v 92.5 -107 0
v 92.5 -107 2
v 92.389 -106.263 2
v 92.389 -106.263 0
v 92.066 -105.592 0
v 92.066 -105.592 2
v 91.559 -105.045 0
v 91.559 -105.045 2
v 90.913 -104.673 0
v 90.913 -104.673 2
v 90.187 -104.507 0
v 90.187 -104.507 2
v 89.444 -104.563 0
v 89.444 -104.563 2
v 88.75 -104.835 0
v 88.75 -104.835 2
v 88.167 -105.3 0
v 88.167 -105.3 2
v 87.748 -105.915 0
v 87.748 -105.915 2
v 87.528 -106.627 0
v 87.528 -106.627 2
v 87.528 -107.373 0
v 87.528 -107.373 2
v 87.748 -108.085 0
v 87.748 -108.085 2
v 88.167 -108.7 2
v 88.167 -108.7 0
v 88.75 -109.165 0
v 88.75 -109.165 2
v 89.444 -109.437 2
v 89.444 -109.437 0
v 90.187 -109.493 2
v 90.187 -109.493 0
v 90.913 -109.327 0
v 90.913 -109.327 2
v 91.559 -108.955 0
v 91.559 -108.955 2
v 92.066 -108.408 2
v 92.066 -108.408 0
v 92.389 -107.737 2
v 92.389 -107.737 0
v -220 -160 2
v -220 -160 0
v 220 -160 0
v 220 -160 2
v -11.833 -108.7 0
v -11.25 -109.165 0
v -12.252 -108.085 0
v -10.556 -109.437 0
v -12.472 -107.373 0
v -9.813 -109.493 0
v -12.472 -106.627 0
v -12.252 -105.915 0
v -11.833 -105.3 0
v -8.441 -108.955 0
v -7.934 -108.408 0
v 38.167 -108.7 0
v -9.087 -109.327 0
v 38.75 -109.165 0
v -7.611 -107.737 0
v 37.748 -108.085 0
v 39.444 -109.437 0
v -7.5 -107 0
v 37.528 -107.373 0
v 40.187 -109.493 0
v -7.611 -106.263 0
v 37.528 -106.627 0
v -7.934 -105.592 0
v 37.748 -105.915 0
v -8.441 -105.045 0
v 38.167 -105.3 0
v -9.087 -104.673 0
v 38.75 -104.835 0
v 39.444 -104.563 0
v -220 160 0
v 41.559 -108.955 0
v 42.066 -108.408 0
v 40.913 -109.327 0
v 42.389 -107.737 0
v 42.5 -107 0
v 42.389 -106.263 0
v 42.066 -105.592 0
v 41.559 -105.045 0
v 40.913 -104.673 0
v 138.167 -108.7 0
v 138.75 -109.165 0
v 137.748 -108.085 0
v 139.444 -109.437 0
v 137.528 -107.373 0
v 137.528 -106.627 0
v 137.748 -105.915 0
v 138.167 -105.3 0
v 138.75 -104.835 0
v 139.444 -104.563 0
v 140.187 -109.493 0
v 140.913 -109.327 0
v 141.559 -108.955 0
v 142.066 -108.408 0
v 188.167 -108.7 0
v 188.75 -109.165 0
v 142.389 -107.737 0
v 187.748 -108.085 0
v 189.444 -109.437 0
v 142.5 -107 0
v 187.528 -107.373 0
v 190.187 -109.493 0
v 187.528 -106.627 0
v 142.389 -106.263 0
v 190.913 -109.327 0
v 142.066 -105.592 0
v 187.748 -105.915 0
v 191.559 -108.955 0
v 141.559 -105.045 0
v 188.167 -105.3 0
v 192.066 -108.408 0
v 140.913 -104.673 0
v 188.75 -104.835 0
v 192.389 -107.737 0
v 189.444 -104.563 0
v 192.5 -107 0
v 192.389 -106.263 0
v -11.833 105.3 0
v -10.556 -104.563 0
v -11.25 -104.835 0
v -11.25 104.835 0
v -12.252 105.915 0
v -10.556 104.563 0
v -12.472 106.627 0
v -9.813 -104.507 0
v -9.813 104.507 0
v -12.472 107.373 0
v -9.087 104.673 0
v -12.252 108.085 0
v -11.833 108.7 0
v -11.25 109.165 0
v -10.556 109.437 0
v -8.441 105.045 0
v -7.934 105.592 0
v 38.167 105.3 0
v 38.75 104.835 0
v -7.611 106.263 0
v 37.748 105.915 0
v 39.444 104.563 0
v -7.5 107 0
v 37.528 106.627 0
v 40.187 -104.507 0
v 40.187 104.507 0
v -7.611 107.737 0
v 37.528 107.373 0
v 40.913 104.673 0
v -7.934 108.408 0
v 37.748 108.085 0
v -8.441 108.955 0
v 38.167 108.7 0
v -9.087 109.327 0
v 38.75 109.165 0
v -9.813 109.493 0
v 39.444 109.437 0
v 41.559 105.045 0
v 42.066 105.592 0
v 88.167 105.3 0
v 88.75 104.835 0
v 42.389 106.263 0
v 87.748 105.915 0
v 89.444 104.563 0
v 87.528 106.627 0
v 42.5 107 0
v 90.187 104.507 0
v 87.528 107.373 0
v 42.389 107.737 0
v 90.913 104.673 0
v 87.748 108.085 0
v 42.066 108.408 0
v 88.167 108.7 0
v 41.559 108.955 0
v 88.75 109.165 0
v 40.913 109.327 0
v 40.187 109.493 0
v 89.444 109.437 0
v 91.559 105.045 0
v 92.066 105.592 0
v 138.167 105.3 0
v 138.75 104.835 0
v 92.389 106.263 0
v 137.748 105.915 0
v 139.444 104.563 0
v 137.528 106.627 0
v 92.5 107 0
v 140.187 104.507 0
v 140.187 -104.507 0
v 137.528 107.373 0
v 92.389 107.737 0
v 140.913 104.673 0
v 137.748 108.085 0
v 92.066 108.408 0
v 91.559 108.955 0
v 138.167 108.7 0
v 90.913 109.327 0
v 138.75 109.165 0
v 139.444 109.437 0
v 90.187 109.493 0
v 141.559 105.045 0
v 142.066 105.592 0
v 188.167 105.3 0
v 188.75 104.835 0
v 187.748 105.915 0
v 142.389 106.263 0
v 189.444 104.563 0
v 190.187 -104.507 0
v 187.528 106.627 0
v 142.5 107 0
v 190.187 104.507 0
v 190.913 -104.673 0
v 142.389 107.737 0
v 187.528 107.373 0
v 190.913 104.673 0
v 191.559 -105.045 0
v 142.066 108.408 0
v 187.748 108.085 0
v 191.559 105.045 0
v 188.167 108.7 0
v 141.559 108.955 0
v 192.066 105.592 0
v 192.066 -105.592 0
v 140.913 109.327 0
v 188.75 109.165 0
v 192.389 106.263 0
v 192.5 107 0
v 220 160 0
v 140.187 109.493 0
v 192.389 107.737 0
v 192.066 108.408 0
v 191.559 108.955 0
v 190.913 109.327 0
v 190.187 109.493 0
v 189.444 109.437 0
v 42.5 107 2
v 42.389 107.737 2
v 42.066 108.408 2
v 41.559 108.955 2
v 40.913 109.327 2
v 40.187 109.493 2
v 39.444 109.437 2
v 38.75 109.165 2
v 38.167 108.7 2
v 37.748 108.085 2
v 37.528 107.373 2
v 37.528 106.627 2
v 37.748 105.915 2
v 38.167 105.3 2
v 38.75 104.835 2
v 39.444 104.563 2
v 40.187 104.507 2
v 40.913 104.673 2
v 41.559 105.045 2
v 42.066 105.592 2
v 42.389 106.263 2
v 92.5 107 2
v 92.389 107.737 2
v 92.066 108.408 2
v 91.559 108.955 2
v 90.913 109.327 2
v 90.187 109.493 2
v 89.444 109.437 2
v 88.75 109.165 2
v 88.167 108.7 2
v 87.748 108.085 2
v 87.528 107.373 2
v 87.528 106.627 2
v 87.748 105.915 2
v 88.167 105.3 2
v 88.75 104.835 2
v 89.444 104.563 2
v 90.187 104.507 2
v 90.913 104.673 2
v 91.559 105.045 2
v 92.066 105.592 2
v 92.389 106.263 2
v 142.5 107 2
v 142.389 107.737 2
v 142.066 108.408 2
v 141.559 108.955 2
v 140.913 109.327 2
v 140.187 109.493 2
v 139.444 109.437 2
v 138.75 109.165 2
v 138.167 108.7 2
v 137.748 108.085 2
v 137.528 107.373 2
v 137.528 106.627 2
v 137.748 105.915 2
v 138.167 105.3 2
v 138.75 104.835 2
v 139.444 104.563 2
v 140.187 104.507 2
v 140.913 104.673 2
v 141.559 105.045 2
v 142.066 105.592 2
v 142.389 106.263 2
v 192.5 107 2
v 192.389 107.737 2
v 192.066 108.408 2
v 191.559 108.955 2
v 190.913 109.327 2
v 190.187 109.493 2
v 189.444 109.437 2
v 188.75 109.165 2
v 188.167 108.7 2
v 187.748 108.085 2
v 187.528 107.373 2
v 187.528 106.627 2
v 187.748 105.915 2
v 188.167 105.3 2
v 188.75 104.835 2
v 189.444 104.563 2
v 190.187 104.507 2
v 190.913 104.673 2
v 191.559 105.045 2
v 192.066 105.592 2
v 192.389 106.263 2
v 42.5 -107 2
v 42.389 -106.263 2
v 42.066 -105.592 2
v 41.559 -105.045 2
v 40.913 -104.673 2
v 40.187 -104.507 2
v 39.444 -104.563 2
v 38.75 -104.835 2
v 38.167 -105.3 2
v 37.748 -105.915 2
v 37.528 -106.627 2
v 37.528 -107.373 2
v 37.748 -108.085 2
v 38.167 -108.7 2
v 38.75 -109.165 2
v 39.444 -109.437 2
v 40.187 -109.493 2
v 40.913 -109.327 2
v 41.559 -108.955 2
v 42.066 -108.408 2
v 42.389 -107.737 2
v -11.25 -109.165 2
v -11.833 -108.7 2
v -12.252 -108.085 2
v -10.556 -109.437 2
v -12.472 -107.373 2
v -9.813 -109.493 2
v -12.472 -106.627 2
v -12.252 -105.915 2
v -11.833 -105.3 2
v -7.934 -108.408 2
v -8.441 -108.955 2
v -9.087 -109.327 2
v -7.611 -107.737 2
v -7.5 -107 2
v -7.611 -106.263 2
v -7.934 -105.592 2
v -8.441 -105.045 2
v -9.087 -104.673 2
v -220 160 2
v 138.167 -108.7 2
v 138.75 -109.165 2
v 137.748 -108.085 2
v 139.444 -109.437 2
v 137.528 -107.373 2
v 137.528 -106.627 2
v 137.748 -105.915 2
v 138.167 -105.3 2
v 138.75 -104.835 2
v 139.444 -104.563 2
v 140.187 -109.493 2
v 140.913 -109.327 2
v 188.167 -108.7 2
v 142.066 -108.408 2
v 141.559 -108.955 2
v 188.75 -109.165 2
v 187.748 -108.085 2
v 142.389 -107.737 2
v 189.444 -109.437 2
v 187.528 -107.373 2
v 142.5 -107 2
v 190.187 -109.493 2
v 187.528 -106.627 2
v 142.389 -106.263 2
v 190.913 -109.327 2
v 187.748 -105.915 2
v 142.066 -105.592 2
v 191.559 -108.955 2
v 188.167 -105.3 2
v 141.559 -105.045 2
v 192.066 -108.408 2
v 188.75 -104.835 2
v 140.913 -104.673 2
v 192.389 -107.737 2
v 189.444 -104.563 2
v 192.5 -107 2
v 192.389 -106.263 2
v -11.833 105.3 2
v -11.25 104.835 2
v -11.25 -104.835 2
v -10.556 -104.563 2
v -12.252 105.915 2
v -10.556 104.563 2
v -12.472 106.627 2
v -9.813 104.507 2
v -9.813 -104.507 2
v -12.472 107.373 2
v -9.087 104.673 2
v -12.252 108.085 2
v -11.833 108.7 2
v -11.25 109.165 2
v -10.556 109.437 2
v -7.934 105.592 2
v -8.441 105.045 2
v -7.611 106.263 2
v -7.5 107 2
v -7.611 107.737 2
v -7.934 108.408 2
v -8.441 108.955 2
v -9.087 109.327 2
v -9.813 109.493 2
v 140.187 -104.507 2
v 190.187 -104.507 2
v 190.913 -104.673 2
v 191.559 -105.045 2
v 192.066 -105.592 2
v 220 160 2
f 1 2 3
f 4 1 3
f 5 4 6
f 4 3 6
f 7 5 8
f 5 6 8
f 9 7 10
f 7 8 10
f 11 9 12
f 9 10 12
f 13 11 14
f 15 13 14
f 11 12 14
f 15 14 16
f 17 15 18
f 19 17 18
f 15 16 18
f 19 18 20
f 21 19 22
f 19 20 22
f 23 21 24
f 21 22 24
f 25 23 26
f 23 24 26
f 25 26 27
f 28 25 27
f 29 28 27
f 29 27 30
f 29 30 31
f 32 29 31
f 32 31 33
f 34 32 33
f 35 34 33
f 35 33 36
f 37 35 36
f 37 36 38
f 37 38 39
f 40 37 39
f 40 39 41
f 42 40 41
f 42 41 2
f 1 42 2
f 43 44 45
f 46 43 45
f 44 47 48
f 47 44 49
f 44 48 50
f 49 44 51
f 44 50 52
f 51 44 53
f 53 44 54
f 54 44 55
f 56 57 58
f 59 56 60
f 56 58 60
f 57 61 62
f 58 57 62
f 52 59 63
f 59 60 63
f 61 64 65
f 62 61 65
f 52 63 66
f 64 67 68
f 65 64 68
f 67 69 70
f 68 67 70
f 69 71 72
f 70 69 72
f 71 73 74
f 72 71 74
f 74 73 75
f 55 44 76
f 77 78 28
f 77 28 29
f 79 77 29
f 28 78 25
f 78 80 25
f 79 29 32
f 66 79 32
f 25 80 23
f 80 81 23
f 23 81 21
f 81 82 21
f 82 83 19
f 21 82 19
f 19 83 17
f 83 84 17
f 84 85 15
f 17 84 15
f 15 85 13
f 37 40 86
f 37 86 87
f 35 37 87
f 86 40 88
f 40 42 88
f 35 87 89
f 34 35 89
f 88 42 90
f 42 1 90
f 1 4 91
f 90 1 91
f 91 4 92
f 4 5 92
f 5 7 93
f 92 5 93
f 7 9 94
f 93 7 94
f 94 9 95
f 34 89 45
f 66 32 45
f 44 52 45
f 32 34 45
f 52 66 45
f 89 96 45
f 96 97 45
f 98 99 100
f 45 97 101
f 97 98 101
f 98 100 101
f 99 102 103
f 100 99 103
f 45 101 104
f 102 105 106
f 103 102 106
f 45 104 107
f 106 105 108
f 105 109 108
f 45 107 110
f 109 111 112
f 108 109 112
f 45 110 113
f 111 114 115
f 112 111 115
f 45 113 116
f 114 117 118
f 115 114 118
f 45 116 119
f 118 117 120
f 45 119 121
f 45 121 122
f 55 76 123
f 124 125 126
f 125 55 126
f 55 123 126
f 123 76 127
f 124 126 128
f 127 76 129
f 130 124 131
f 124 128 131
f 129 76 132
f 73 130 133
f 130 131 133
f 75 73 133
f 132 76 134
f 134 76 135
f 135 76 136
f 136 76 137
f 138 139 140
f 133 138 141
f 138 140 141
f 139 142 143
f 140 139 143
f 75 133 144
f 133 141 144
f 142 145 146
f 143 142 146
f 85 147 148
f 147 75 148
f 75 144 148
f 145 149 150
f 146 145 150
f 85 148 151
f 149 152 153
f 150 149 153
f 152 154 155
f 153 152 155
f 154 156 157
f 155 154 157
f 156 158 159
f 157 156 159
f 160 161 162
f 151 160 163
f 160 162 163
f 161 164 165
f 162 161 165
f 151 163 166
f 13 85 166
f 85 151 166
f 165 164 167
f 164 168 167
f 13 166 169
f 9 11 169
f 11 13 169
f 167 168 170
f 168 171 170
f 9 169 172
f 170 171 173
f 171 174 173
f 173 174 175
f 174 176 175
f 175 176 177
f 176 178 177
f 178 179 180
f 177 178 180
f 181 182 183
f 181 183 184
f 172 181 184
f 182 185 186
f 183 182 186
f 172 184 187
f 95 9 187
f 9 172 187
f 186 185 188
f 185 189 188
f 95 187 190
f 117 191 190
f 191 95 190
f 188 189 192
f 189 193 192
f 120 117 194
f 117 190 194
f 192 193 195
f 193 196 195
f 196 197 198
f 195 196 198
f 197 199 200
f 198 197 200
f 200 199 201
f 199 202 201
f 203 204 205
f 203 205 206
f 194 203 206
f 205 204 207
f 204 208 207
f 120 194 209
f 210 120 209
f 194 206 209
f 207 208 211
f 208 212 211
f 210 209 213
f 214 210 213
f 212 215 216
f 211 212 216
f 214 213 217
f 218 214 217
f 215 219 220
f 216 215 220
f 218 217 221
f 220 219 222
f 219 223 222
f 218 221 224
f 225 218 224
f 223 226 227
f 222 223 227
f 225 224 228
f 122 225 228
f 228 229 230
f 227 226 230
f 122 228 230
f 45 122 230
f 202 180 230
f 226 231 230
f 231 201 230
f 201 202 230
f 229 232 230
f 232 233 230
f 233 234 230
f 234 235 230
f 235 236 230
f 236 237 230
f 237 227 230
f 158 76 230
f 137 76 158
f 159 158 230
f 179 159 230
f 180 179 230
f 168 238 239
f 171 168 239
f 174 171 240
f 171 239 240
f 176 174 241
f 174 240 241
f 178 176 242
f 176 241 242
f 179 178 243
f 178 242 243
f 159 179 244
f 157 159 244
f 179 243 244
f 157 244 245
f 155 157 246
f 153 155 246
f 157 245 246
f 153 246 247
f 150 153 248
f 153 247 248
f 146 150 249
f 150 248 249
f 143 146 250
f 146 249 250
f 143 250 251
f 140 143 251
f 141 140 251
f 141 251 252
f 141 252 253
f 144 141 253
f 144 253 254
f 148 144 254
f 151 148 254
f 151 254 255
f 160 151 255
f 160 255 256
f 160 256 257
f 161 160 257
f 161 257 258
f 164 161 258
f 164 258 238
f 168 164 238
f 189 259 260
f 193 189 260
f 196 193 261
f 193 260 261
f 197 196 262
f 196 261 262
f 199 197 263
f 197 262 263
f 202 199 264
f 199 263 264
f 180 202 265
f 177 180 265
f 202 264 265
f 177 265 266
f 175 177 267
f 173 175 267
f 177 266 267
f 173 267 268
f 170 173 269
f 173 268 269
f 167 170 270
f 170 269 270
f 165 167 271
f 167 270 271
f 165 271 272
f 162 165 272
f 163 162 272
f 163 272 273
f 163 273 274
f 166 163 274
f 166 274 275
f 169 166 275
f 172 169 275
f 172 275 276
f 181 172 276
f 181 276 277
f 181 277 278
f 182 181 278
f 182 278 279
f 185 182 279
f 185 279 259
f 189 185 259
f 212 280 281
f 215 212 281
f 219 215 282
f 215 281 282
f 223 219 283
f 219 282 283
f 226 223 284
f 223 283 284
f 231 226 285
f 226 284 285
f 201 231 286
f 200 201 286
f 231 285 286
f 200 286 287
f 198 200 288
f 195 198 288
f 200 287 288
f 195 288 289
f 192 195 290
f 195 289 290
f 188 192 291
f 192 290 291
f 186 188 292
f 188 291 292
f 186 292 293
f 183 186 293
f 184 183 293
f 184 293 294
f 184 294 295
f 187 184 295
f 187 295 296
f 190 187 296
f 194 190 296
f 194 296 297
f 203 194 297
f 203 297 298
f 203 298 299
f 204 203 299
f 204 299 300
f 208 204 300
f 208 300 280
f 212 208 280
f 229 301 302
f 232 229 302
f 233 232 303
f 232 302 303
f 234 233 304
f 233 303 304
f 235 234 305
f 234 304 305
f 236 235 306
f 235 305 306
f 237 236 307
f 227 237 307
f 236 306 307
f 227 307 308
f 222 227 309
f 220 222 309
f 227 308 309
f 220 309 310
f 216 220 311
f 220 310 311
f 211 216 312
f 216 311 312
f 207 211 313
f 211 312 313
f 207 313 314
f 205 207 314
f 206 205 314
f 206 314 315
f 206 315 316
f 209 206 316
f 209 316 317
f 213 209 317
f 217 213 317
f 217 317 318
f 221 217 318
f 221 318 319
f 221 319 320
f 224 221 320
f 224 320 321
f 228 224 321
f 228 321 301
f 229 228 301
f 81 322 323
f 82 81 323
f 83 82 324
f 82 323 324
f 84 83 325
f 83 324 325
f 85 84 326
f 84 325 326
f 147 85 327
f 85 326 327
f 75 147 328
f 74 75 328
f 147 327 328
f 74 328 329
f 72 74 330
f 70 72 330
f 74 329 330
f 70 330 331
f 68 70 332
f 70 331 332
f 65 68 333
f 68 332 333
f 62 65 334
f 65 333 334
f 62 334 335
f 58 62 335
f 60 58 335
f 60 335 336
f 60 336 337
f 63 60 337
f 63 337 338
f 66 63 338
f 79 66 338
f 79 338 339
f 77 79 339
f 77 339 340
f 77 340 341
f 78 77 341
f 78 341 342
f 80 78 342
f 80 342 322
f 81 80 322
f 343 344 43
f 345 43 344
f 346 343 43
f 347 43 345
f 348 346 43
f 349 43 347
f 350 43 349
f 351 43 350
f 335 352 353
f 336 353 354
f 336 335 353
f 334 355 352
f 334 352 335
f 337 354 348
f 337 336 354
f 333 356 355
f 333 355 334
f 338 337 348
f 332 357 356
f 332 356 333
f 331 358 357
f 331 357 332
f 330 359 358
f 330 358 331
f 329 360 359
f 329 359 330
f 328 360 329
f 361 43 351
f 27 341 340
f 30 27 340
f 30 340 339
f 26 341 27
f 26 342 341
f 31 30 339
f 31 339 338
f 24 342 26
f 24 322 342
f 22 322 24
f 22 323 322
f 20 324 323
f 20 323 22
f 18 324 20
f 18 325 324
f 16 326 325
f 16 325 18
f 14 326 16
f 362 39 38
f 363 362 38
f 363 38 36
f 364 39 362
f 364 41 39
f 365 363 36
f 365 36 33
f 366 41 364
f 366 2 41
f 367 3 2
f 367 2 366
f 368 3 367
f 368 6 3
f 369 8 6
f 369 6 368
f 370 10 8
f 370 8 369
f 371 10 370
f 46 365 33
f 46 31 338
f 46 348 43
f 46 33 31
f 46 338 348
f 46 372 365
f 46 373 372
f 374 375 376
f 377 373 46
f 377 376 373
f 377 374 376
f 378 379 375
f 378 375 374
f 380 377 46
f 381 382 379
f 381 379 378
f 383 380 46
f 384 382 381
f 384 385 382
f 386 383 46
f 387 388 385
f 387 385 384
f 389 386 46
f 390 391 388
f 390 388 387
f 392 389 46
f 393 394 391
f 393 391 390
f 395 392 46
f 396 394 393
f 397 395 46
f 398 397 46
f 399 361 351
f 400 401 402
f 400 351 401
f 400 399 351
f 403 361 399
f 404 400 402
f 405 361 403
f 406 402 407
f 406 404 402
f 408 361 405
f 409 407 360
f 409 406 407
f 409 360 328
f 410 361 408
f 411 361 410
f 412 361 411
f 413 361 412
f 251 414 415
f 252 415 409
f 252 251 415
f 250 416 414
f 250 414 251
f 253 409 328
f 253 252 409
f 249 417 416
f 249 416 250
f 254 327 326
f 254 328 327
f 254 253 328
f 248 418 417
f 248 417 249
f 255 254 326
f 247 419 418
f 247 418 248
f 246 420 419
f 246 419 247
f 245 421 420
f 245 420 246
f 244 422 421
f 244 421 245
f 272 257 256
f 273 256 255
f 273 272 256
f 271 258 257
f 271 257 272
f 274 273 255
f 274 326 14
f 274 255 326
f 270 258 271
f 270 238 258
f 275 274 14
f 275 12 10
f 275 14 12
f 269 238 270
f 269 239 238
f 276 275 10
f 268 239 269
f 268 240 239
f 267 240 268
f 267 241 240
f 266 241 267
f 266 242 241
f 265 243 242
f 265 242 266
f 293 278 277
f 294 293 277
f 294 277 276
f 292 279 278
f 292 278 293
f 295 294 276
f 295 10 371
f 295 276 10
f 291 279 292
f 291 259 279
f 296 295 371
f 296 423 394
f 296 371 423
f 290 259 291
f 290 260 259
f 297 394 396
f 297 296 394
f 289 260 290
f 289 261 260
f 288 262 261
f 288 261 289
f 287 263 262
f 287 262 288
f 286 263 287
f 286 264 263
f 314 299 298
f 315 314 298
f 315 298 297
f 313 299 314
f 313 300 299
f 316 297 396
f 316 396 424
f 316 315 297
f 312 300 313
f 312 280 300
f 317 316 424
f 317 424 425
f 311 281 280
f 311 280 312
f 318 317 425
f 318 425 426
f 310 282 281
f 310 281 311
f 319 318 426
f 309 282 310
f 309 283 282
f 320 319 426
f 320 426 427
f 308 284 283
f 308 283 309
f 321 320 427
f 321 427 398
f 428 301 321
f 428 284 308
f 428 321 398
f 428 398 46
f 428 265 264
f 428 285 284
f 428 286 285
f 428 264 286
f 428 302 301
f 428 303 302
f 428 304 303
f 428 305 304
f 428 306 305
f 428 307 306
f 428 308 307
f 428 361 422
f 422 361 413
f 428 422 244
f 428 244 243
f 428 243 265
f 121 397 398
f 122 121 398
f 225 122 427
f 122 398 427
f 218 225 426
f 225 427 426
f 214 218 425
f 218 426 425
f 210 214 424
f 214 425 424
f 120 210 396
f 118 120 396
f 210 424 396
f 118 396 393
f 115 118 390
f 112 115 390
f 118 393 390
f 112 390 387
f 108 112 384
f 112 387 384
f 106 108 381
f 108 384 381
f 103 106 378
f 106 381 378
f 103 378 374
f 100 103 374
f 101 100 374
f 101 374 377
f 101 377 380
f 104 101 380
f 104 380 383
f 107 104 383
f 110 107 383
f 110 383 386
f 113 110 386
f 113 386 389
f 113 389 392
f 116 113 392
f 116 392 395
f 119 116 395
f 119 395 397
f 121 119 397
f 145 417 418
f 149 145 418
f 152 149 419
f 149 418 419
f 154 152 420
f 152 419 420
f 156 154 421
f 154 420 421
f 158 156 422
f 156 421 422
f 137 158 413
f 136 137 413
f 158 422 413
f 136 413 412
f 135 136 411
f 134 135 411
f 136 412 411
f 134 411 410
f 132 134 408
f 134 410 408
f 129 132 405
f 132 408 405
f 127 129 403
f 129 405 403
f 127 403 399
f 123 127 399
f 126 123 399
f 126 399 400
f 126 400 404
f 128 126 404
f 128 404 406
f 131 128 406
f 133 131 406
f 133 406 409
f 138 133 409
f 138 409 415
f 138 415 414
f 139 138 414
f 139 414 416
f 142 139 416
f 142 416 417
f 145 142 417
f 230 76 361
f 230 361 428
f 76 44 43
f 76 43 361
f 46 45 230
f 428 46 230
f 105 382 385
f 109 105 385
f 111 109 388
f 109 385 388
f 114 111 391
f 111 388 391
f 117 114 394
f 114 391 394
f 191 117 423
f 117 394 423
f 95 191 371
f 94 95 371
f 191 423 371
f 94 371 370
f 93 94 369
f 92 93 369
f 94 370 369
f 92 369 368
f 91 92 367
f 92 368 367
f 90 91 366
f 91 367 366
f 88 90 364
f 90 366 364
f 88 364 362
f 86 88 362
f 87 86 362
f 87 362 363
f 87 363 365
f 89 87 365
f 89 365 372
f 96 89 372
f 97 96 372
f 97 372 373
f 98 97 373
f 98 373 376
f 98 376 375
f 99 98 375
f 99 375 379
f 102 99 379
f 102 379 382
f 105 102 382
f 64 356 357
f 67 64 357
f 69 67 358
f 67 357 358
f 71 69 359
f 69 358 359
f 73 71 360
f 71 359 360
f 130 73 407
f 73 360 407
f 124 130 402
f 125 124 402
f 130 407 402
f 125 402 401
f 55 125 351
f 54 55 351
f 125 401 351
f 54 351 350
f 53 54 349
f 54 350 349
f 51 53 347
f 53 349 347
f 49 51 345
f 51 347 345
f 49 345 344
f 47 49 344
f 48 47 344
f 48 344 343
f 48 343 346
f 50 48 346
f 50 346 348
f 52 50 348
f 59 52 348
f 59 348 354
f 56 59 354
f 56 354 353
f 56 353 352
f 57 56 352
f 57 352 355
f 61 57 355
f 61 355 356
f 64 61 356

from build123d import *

# Parameters (mm, degrees)
SKETCH_1_W          = 440
SKETCH_1_H          = 320
EXTRUDE_1_DEPTH     = 2
SKETCH_2_R          = 2.5
CUT_EXTRUDE_1_DEPTH = 10


with BuildPart() as part:
    # 草图1 → 凸台-拉伸1 (new body)
    with BuildSketch(Plane.XY):
        Rectangle(SKETCH_1_W, SKETCH_1_H)
    extrude(amount=EXTRUDE_1_DEPTH)

    # 草图2 → 切除-拉伸1 (cut)
    with BuildSketch(Plane.XY.offset(2)):
        with Locations((190, 107)):
            Circle(SKETCH_2_R)
        with Locations((140, 107)):
            Circle(SKETCH_2_R)
        with Locations((90, 107)):
            Circle(SKETCH_2_R)
        with Locations((40, 107)):
            Circle(SKETCH_2_R)
        with Locations((-10, 107)):
            Circle(SKETCH_2_R)
        with Locations((-10, -107)):
            Circle(SKETCH_2_R)
        with Locations((40, -107)):
            Circle(SKETCH_2_R)
        with Locations((90, -107)):
            Circle(SKETCH_2_R)
        with Locations((140, -107)):
            Circle(SKETCH_2_R)
        with Locations((190, -107)):
            Circle(SKETCH_2_R)
    extrude(amount=-CUT_EXTRUDE_1_DEPTH, mode=Mode.SUBTRACT)


solid = part.part
